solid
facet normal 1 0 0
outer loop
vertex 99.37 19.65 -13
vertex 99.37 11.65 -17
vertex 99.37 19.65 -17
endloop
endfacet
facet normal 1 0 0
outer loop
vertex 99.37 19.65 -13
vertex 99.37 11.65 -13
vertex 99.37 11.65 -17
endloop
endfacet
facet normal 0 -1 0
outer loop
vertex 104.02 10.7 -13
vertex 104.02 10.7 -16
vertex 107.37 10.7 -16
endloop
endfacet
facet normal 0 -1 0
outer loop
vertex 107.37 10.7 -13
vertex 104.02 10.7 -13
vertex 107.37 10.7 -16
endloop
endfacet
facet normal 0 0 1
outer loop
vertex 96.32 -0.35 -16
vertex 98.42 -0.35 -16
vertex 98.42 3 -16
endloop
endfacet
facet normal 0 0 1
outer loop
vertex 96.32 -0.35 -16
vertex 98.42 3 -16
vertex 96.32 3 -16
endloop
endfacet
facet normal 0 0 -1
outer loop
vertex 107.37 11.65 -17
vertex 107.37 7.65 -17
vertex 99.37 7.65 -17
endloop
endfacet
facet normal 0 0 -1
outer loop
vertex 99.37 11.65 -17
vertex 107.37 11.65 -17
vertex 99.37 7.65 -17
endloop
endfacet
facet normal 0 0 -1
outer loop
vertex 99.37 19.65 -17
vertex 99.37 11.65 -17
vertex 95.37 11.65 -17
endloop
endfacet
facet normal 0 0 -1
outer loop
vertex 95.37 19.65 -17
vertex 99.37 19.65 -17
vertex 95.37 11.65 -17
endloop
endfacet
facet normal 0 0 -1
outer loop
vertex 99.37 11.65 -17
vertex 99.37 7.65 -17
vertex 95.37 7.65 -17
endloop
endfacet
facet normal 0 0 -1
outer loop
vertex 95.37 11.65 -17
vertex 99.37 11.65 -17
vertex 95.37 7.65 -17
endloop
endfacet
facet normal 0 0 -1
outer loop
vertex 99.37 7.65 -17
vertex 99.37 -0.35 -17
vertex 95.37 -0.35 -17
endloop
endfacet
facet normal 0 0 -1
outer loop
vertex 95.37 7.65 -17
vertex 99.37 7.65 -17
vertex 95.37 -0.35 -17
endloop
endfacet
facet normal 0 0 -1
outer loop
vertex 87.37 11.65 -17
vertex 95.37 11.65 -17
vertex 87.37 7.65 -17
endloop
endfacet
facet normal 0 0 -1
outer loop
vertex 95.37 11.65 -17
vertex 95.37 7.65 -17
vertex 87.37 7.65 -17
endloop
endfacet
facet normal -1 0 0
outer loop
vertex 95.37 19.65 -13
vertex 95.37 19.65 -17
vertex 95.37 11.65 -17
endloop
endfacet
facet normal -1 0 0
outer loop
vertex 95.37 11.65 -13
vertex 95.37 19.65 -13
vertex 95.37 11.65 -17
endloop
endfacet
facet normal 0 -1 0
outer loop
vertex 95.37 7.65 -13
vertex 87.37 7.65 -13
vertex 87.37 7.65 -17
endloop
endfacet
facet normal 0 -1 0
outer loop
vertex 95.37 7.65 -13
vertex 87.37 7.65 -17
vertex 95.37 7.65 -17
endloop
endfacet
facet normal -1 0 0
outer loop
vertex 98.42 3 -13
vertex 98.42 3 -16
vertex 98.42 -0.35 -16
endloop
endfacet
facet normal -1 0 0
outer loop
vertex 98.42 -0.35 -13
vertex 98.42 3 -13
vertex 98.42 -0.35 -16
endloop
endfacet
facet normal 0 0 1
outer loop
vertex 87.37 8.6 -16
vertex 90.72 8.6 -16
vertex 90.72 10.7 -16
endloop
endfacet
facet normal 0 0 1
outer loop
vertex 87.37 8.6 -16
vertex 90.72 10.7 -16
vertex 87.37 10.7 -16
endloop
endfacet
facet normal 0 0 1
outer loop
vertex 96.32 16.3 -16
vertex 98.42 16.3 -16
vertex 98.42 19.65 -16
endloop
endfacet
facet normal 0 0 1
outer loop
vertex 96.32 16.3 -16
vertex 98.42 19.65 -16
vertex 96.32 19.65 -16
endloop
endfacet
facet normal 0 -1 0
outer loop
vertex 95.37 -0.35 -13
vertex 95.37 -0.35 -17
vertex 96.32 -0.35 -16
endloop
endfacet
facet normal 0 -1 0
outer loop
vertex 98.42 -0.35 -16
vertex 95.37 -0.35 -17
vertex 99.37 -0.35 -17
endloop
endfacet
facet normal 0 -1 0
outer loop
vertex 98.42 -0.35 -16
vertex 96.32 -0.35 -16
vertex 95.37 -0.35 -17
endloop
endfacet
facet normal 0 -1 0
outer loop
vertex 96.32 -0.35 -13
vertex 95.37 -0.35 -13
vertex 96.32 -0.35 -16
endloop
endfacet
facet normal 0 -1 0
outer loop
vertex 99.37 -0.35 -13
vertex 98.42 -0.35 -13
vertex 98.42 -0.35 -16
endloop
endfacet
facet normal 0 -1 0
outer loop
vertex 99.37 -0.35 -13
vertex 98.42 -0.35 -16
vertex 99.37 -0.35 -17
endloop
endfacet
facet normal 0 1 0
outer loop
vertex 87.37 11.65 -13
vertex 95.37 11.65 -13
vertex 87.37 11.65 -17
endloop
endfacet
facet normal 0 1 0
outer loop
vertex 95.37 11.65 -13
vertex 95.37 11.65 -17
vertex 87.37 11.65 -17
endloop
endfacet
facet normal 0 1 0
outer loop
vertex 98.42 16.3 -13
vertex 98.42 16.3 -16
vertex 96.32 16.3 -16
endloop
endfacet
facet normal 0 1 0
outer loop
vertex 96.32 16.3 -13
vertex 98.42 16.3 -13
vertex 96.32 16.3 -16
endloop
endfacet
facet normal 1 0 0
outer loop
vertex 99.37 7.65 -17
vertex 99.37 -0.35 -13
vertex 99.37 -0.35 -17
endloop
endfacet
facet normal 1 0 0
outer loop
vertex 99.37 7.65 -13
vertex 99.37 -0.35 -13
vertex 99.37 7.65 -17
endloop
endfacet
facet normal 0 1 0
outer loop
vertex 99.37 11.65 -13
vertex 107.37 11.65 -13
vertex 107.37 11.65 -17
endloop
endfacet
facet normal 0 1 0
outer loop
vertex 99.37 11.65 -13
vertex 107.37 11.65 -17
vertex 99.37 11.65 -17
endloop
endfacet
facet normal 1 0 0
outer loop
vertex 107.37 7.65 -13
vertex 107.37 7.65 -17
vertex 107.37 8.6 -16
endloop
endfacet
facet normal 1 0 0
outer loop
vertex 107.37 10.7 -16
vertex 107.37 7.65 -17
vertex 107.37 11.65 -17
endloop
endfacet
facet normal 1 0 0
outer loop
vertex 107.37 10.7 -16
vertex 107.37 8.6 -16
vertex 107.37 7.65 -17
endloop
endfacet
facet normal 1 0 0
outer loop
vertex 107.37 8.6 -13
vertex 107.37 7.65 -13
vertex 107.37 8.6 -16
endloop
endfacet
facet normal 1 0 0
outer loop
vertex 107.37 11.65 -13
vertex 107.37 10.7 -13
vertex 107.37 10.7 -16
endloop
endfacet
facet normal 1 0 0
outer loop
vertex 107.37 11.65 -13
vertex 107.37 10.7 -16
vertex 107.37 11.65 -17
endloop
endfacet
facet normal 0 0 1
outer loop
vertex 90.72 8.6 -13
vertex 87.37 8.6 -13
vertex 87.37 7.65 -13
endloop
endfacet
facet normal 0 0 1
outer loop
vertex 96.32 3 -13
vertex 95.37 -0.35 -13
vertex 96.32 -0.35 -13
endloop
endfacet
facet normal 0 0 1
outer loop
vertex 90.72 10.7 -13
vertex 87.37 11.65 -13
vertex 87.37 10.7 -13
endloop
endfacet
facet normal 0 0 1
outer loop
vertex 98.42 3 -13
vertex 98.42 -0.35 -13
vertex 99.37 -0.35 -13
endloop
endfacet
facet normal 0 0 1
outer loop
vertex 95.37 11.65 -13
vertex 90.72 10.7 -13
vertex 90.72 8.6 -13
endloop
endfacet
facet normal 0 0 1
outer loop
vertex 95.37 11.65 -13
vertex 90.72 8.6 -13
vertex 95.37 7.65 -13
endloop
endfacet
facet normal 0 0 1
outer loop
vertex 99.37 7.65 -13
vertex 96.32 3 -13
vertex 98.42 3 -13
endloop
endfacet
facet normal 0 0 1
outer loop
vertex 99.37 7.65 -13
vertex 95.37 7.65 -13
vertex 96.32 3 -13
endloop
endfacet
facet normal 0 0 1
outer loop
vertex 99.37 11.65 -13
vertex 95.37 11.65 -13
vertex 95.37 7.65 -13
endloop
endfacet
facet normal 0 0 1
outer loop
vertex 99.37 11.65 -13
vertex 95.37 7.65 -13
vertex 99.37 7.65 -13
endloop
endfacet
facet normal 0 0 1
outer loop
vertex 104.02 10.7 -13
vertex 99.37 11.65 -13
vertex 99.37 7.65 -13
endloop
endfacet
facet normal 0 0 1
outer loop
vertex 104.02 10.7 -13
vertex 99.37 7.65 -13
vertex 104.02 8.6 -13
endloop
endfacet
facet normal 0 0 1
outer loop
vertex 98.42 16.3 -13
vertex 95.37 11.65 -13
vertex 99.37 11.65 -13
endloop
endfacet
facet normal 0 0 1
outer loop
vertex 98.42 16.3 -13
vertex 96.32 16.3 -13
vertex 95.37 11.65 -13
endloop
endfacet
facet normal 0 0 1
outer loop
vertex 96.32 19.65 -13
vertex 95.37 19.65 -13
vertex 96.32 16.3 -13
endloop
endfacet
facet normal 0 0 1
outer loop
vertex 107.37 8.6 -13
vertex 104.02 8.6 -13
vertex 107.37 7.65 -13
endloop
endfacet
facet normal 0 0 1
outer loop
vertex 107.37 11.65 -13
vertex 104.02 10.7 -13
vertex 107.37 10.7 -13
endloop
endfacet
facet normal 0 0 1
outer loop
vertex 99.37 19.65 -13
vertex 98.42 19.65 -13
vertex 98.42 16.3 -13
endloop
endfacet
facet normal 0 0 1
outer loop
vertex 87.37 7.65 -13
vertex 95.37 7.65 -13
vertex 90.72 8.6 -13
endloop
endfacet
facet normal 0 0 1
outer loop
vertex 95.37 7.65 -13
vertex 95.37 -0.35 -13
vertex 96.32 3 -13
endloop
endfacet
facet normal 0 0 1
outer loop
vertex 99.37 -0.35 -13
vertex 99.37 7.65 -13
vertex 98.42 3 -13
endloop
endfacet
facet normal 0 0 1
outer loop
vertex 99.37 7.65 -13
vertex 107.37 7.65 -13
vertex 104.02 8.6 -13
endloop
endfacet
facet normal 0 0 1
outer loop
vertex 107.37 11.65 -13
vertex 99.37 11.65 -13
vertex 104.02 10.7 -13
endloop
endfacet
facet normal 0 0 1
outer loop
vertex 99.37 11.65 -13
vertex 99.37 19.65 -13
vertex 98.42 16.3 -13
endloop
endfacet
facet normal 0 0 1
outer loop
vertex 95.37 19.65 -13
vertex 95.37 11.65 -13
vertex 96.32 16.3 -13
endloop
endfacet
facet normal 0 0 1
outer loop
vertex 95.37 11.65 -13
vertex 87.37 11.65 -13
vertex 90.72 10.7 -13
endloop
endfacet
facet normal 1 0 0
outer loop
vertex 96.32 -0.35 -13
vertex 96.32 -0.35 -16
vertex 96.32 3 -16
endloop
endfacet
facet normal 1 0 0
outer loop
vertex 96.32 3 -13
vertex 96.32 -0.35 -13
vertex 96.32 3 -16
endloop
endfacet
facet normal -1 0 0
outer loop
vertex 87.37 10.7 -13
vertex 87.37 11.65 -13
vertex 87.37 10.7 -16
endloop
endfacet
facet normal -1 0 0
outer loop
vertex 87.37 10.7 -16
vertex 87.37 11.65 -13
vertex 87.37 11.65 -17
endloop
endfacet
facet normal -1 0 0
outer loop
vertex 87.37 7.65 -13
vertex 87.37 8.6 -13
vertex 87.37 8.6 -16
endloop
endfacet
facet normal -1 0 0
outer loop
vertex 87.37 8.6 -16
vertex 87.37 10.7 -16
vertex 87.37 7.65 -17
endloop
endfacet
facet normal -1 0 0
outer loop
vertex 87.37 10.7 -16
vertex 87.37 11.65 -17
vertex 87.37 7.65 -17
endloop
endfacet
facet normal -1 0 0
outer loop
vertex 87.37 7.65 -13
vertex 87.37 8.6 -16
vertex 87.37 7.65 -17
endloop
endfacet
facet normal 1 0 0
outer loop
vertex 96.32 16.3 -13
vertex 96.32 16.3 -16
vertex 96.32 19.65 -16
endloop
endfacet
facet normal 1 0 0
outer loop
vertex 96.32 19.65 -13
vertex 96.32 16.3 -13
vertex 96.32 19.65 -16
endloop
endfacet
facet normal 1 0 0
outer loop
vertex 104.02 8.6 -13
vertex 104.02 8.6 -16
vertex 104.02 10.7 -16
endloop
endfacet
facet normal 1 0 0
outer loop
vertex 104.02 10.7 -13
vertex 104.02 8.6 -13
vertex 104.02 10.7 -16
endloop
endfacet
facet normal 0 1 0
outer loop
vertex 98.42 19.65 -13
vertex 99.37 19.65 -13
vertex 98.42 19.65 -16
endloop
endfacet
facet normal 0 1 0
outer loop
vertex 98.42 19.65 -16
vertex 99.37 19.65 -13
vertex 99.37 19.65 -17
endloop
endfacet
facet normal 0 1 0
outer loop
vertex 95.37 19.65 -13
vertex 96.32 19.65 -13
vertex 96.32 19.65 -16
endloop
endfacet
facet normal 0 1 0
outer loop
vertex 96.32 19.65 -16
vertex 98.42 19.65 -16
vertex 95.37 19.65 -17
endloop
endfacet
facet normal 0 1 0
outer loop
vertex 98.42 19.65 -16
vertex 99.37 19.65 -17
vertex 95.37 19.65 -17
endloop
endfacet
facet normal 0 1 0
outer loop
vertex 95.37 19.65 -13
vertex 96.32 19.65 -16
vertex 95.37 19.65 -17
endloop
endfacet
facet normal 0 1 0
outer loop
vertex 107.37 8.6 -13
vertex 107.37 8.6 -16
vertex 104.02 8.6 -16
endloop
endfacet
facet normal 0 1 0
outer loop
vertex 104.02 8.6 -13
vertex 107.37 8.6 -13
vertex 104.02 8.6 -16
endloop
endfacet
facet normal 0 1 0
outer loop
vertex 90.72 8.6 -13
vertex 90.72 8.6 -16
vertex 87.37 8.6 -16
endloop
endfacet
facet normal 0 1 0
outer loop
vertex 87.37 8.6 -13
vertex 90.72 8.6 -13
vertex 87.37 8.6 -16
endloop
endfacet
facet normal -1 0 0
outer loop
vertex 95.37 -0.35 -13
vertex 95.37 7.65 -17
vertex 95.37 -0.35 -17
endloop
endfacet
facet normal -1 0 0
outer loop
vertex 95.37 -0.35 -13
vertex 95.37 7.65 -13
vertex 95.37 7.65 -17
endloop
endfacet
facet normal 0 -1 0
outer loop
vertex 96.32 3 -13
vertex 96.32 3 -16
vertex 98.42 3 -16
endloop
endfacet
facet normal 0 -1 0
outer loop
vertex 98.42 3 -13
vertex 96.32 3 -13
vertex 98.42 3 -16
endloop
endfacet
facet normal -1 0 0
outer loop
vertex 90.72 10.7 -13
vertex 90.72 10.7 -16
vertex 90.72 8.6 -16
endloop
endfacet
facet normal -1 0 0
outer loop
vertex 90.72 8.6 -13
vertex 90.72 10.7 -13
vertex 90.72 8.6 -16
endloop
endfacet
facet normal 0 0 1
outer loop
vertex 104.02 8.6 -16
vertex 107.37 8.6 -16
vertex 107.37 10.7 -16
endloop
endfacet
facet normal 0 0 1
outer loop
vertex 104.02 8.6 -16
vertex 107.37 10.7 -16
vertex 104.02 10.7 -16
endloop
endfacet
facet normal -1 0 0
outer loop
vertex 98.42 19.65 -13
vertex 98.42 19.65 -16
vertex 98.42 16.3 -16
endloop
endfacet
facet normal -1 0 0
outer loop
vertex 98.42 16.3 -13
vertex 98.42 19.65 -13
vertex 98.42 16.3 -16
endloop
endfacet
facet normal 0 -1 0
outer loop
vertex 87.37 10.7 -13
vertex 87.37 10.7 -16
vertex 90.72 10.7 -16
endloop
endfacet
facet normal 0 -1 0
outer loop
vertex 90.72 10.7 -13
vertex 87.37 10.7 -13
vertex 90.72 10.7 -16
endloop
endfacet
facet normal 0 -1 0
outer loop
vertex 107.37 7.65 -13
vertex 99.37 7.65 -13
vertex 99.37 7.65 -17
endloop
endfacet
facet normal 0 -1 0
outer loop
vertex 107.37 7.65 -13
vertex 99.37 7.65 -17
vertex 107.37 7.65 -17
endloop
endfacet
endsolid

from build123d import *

# Parameters (mm, degrees)
PAD322_DEPTH            = 1
PAD323_DEPTH            = 3
PAD324_DEPTH            = 3
BODY054_PLACEMENT_ANGLE = 180


with BuildPart() as part:
    # Sketch479 → Pad322 (new body)
    with BuildSketch(Plane.XY.offset(-28)):
        Polygon((-2, 2), (-2, 10), (2, 10), (2, 2), (10, 2), (10, -2), (2, -2), (2, -10), (-2, -10), (-2, -2), (-10, -2), (-10, 2), align=None)
    extrude(amount=PAD322_DEPTH)

    # Sketch480 (on Face13 of Pad322) → Pad323 (join)
    with BuildSketch(Plane(origin=(0, 0, -28), x_dir=(1, 0, 0), z_dir=(0, 0, -1))):
        Polygon((-2, 10), (-2, 2), (-10, 2), (-10, 1.05), (-1.05, 1.05), (-1.05, 10), align=None)
        Polygon((-10, -2), (-2, -2), (-2, -10), (-1.05, -10), (-1.05, -1.05), (-10, -1.05), align=None)
        Polygon((2, -10), (2, -2), (10, -2), (10, -1.05), (1.05, -1.05), (1.05, -10), align=None)
        Polygon((10, 2), (2, 2), (2, 10), (1.05, 10), (1.05, 1.05), (10, 1.05), align=None)
    extrude(amount=PAD323_DEPTH)

    # Sketch481 (on Face3 of Pad323) → Pad324 (join)
    with BuildSketch(Plane(origin=(0, 0, -28), x_dir=(1, 0, 0), z_dir=(0, 0, -1))):
        Polygon((-6.65, 1.05), (-6.65, -1.05), (-1.05, -1.05), (-1.05, -6.65), (1.05, -6.65), (1.05, -1.05), (6.65, -1.05), (6.65, 1.05), (1.05, 1.05), (1.05, 6.65), (-1.05, 6.65), (-1.05, 1.05), align=None)
    extrude(amount=PAD324_DEPTH)


with BuildPart() as part_1:
    # Body054 placement: moved
    add(part.part.moved(Location((97.37, 9.65, -44))).rotate(Axis((97.37, 9.65, -44), (1, 0, 0)), BODY054_PLACEMENT_ANGLE))


solid = part_1.part
